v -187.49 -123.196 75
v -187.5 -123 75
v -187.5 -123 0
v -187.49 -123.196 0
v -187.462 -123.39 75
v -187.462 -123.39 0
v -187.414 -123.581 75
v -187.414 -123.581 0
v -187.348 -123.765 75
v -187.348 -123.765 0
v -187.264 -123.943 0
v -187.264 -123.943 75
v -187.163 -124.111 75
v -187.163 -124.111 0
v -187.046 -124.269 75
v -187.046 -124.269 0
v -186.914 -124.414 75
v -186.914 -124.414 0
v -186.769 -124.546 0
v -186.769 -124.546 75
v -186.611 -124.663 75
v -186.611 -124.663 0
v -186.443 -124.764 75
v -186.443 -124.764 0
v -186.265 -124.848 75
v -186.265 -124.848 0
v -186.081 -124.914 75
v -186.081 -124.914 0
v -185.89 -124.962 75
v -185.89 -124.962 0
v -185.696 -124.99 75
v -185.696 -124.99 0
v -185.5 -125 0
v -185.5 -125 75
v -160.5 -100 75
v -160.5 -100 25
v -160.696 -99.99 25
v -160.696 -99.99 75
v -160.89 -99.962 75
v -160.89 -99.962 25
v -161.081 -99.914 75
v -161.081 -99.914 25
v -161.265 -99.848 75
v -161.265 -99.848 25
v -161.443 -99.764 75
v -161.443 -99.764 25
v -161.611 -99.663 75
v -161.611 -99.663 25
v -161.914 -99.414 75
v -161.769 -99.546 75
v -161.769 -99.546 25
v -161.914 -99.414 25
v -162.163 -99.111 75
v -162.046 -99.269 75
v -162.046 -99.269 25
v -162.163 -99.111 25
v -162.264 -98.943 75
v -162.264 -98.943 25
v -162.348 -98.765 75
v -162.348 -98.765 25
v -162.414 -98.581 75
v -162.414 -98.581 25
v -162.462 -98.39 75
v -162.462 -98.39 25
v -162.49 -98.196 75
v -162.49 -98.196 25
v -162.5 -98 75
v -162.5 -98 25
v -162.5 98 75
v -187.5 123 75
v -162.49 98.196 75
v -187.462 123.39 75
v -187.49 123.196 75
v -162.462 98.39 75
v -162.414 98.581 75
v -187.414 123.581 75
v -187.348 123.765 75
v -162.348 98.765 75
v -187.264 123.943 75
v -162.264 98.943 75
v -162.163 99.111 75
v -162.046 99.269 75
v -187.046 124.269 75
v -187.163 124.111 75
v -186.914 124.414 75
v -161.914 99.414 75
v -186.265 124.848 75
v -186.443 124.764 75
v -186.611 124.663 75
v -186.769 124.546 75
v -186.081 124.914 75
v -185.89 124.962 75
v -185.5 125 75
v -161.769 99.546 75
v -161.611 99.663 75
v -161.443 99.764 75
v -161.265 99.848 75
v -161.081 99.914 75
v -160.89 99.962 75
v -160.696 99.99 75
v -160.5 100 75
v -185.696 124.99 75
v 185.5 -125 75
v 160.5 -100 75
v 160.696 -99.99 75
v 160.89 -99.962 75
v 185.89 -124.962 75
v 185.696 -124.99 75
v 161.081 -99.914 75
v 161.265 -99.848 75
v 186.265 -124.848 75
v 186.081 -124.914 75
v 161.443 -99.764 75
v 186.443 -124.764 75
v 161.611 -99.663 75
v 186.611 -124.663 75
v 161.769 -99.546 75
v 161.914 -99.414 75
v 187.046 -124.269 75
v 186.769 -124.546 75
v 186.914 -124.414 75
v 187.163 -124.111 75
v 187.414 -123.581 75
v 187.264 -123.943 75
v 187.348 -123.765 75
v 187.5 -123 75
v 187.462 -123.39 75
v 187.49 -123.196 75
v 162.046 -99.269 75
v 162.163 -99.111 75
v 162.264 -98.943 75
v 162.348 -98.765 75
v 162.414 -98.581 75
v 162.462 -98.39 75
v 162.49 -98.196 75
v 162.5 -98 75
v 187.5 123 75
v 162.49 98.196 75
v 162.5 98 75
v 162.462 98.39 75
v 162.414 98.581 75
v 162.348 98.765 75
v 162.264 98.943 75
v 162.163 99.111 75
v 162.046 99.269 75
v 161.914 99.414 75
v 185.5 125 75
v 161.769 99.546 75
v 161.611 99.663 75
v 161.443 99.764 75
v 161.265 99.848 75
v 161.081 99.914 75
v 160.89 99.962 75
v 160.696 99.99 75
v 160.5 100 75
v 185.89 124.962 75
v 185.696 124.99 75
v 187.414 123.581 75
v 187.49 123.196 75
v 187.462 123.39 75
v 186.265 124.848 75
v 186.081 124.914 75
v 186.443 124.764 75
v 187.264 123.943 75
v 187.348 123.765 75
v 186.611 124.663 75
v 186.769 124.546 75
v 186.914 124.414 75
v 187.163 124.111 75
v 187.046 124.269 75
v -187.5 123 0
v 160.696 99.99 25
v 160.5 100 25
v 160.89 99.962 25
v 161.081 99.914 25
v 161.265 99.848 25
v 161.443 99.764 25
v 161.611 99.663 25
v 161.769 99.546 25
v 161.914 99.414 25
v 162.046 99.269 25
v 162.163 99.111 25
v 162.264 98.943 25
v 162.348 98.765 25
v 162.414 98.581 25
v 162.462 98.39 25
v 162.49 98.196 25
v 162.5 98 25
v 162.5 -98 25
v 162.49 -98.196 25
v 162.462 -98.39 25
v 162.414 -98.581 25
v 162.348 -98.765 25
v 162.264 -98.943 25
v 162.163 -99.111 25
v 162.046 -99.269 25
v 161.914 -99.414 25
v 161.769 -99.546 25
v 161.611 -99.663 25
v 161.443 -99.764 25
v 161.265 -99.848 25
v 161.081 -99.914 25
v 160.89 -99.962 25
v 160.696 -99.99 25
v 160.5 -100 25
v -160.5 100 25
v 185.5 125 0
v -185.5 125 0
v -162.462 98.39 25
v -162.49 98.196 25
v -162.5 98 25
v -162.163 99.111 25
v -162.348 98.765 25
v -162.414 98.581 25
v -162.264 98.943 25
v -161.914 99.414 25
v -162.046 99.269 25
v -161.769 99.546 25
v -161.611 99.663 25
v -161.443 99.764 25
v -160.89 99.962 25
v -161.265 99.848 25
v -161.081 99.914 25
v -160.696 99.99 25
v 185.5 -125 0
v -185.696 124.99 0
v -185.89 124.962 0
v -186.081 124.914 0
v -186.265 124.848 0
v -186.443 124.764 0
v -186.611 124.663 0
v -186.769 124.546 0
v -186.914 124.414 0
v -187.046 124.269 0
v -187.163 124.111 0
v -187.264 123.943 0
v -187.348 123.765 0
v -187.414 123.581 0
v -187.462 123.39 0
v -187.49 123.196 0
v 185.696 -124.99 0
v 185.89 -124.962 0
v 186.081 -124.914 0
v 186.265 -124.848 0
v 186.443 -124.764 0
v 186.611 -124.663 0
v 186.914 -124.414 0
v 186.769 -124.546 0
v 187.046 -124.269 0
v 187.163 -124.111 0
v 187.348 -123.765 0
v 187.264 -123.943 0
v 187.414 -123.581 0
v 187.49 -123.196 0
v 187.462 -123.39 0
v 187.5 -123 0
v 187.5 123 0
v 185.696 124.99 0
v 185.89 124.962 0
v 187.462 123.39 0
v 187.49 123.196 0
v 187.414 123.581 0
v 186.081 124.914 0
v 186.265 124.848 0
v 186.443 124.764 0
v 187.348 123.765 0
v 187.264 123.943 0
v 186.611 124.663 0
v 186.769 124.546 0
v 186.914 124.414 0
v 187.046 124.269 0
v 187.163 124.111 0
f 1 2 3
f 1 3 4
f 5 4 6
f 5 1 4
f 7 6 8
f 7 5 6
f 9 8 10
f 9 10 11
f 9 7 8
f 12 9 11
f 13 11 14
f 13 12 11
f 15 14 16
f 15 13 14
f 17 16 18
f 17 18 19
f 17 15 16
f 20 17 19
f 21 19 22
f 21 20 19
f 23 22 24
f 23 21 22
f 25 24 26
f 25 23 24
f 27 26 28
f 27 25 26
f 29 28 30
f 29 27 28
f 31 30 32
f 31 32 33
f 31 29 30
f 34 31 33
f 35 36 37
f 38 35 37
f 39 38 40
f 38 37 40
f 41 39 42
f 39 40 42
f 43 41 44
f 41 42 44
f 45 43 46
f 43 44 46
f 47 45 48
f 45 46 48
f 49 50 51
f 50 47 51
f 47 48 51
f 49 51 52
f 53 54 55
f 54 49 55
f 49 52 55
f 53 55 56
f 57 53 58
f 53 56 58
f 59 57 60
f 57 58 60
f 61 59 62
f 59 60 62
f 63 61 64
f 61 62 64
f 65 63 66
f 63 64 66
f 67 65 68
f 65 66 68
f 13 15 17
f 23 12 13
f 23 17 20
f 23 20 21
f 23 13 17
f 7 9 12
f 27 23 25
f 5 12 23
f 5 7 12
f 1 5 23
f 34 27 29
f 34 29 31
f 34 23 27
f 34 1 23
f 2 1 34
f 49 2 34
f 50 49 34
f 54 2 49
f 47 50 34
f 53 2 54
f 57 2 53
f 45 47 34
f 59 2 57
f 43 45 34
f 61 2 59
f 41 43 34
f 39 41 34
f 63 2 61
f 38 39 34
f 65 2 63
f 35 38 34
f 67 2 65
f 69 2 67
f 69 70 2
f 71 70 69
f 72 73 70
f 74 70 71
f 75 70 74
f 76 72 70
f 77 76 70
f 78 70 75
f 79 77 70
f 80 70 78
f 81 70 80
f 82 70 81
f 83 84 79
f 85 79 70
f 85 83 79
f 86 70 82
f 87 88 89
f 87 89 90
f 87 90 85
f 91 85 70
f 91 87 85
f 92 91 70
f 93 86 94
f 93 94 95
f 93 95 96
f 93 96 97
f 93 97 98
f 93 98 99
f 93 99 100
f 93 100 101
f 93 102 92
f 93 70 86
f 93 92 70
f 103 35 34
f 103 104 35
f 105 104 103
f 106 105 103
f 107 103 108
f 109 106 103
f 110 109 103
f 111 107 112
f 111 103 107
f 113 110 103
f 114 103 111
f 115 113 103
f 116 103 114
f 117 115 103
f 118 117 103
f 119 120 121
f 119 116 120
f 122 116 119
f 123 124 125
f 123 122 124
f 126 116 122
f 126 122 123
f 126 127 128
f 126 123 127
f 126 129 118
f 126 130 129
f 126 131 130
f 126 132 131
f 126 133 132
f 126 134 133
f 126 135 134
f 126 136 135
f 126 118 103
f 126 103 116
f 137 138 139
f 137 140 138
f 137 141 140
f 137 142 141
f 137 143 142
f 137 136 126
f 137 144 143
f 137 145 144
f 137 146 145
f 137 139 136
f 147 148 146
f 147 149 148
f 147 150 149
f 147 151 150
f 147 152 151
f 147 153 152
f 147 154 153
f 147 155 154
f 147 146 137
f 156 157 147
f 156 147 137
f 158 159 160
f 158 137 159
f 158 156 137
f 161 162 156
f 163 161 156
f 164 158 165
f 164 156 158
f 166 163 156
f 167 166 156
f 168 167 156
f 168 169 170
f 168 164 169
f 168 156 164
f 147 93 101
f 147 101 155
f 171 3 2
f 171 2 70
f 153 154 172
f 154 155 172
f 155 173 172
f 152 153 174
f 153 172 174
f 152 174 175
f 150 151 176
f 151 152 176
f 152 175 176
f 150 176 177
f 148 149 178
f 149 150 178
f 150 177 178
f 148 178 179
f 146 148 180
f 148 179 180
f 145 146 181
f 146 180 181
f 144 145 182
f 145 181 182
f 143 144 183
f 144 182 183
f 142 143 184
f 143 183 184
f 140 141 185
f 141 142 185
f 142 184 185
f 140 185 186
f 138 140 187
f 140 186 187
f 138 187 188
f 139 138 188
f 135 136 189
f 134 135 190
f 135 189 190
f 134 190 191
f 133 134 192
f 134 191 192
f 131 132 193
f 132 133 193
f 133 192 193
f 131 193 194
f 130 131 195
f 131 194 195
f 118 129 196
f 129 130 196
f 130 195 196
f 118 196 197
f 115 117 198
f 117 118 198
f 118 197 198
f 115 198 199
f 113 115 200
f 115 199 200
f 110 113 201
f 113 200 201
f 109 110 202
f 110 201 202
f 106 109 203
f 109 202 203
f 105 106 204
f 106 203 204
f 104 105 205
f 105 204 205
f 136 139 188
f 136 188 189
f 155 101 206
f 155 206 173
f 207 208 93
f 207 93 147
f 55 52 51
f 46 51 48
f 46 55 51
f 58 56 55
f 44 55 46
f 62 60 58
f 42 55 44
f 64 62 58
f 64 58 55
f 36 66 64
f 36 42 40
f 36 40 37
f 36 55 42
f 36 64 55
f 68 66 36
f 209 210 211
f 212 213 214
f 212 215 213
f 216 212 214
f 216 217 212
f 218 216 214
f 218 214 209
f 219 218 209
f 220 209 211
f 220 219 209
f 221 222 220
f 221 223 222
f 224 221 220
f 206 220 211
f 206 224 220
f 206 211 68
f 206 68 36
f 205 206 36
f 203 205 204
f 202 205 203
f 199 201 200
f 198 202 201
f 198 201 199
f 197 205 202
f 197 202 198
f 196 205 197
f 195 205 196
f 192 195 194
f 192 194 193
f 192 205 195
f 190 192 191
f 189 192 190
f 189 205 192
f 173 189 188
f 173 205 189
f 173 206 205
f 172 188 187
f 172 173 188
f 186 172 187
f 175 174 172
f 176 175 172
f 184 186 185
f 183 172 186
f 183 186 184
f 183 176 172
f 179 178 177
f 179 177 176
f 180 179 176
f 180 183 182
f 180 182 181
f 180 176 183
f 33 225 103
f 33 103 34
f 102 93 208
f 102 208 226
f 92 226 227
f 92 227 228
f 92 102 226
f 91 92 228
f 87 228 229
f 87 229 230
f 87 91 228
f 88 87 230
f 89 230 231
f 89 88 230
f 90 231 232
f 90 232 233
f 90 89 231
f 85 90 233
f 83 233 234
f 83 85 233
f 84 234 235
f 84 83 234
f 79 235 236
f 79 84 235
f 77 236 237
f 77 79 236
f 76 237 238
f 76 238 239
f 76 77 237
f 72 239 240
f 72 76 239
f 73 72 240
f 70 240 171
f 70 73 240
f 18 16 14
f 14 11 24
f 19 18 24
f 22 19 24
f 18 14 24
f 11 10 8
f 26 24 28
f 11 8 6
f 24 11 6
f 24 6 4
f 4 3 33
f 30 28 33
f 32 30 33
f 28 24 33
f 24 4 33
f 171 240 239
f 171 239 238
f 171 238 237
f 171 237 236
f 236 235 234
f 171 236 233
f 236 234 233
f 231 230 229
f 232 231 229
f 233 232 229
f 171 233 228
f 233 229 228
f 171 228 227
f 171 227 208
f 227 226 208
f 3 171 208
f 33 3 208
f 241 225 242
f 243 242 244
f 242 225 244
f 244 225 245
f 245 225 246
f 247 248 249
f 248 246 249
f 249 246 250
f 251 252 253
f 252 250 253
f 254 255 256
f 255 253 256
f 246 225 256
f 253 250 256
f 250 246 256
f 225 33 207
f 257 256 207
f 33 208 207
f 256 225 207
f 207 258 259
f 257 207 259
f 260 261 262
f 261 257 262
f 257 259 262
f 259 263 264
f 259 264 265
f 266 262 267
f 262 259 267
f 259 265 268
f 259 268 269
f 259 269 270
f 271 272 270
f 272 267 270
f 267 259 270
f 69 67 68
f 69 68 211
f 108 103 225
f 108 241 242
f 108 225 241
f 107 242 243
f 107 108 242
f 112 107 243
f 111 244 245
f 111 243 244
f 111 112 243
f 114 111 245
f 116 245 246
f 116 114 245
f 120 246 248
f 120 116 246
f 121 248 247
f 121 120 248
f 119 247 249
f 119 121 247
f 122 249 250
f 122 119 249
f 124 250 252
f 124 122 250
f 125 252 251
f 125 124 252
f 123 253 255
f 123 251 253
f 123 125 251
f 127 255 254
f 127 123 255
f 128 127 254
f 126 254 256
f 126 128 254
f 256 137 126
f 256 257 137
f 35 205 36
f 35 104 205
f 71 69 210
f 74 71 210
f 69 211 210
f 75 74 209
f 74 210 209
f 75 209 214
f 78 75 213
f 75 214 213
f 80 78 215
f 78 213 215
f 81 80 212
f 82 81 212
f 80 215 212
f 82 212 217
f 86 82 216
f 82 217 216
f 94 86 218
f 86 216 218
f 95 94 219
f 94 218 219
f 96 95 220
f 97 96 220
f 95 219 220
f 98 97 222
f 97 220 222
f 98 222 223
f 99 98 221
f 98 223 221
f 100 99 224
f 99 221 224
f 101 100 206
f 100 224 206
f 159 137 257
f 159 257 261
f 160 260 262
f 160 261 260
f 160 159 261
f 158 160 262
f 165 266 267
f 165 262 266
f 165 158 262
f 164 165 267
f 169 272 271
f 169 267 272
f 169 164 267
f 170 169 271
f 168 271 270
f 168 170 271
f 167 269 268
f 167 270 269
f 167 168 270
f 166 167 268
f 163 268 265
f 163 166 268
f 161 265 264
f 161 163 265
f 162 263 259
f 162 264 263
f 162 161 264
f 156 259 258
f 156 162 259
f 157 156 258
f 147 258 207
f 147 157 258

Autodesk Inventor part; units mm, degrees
ref_plane "YZ Plane" through (0, 0, 0) normal (1, 0, 0) x (0, 1, 0)
ref_plane "XZ Plane" through (0, 0, 0) normal (0, 1, 0) x (-1, 0, 0)
ref_plane "XY Plane" through (0, 0, 0) normal (0, 0, 1) x (1, 0, 0)
sketch "PanelDimension" plane through (0, 0, 0) normal (0, 0, 1) x (1, 0, 0)
  line L0 (-187.5, 125) -> (187.5, 125)
  line L1 (187.5, 125) -> (187.5, -125)
  line L2 (187.5, -125) -> (-187.5, -125)
  line L3 (-187.5, -125) -> (-187.5, 125)
  point P0 (0, 0)
  point P1 (-187.5, 0)
  point P2 (0, 125)
  dimension "d0" = 375
  dimension "d2" = 250
extrude "BodyExtrusion" add sketch "PanelDimension" along normal blind 75
sketch "PanelInside" plane through (0, 0, 75) normal (0, 0, 1) x (1, 0, 0)
  line L0 (187.5, 125) -> (-187.5, 125) projected
  line L1 (-187.5, 125) -> (-187.5, -125) projected
  line L2 (-162.5, 100) -> (162.5, 100)
  line L3 (162.5, 100) -> (162.5, -100)
  line L4 (162.5, -100) -> (-162.5, -100)
  line L5 (-162.5, -100) -> (-162.5, 100)
  point P0 (0, 0)
  point P1 (-162.5, 0)
  point P2 (0, 100)
  dimension "d7" = 25
  dimension "d8" = 25
extrude "CavityExtrusion" cut sketch "PanelInside" against normal blind 50
fillet "BodyOutsideFillet" radius 2 4 edges at (-187.5, 125, 37.5) (187.5, 125, 37.5) (187.5, -125, 37.5) (-187.5, -125, 37.5)
fillet "BodyInsideFillet" radius 2 4 edges at (162.5, 100, 50) (-162.5, 100, 50) (-162.5, -100, 50) (162.5, -100, 50)
properties part number "Panel_Body"
